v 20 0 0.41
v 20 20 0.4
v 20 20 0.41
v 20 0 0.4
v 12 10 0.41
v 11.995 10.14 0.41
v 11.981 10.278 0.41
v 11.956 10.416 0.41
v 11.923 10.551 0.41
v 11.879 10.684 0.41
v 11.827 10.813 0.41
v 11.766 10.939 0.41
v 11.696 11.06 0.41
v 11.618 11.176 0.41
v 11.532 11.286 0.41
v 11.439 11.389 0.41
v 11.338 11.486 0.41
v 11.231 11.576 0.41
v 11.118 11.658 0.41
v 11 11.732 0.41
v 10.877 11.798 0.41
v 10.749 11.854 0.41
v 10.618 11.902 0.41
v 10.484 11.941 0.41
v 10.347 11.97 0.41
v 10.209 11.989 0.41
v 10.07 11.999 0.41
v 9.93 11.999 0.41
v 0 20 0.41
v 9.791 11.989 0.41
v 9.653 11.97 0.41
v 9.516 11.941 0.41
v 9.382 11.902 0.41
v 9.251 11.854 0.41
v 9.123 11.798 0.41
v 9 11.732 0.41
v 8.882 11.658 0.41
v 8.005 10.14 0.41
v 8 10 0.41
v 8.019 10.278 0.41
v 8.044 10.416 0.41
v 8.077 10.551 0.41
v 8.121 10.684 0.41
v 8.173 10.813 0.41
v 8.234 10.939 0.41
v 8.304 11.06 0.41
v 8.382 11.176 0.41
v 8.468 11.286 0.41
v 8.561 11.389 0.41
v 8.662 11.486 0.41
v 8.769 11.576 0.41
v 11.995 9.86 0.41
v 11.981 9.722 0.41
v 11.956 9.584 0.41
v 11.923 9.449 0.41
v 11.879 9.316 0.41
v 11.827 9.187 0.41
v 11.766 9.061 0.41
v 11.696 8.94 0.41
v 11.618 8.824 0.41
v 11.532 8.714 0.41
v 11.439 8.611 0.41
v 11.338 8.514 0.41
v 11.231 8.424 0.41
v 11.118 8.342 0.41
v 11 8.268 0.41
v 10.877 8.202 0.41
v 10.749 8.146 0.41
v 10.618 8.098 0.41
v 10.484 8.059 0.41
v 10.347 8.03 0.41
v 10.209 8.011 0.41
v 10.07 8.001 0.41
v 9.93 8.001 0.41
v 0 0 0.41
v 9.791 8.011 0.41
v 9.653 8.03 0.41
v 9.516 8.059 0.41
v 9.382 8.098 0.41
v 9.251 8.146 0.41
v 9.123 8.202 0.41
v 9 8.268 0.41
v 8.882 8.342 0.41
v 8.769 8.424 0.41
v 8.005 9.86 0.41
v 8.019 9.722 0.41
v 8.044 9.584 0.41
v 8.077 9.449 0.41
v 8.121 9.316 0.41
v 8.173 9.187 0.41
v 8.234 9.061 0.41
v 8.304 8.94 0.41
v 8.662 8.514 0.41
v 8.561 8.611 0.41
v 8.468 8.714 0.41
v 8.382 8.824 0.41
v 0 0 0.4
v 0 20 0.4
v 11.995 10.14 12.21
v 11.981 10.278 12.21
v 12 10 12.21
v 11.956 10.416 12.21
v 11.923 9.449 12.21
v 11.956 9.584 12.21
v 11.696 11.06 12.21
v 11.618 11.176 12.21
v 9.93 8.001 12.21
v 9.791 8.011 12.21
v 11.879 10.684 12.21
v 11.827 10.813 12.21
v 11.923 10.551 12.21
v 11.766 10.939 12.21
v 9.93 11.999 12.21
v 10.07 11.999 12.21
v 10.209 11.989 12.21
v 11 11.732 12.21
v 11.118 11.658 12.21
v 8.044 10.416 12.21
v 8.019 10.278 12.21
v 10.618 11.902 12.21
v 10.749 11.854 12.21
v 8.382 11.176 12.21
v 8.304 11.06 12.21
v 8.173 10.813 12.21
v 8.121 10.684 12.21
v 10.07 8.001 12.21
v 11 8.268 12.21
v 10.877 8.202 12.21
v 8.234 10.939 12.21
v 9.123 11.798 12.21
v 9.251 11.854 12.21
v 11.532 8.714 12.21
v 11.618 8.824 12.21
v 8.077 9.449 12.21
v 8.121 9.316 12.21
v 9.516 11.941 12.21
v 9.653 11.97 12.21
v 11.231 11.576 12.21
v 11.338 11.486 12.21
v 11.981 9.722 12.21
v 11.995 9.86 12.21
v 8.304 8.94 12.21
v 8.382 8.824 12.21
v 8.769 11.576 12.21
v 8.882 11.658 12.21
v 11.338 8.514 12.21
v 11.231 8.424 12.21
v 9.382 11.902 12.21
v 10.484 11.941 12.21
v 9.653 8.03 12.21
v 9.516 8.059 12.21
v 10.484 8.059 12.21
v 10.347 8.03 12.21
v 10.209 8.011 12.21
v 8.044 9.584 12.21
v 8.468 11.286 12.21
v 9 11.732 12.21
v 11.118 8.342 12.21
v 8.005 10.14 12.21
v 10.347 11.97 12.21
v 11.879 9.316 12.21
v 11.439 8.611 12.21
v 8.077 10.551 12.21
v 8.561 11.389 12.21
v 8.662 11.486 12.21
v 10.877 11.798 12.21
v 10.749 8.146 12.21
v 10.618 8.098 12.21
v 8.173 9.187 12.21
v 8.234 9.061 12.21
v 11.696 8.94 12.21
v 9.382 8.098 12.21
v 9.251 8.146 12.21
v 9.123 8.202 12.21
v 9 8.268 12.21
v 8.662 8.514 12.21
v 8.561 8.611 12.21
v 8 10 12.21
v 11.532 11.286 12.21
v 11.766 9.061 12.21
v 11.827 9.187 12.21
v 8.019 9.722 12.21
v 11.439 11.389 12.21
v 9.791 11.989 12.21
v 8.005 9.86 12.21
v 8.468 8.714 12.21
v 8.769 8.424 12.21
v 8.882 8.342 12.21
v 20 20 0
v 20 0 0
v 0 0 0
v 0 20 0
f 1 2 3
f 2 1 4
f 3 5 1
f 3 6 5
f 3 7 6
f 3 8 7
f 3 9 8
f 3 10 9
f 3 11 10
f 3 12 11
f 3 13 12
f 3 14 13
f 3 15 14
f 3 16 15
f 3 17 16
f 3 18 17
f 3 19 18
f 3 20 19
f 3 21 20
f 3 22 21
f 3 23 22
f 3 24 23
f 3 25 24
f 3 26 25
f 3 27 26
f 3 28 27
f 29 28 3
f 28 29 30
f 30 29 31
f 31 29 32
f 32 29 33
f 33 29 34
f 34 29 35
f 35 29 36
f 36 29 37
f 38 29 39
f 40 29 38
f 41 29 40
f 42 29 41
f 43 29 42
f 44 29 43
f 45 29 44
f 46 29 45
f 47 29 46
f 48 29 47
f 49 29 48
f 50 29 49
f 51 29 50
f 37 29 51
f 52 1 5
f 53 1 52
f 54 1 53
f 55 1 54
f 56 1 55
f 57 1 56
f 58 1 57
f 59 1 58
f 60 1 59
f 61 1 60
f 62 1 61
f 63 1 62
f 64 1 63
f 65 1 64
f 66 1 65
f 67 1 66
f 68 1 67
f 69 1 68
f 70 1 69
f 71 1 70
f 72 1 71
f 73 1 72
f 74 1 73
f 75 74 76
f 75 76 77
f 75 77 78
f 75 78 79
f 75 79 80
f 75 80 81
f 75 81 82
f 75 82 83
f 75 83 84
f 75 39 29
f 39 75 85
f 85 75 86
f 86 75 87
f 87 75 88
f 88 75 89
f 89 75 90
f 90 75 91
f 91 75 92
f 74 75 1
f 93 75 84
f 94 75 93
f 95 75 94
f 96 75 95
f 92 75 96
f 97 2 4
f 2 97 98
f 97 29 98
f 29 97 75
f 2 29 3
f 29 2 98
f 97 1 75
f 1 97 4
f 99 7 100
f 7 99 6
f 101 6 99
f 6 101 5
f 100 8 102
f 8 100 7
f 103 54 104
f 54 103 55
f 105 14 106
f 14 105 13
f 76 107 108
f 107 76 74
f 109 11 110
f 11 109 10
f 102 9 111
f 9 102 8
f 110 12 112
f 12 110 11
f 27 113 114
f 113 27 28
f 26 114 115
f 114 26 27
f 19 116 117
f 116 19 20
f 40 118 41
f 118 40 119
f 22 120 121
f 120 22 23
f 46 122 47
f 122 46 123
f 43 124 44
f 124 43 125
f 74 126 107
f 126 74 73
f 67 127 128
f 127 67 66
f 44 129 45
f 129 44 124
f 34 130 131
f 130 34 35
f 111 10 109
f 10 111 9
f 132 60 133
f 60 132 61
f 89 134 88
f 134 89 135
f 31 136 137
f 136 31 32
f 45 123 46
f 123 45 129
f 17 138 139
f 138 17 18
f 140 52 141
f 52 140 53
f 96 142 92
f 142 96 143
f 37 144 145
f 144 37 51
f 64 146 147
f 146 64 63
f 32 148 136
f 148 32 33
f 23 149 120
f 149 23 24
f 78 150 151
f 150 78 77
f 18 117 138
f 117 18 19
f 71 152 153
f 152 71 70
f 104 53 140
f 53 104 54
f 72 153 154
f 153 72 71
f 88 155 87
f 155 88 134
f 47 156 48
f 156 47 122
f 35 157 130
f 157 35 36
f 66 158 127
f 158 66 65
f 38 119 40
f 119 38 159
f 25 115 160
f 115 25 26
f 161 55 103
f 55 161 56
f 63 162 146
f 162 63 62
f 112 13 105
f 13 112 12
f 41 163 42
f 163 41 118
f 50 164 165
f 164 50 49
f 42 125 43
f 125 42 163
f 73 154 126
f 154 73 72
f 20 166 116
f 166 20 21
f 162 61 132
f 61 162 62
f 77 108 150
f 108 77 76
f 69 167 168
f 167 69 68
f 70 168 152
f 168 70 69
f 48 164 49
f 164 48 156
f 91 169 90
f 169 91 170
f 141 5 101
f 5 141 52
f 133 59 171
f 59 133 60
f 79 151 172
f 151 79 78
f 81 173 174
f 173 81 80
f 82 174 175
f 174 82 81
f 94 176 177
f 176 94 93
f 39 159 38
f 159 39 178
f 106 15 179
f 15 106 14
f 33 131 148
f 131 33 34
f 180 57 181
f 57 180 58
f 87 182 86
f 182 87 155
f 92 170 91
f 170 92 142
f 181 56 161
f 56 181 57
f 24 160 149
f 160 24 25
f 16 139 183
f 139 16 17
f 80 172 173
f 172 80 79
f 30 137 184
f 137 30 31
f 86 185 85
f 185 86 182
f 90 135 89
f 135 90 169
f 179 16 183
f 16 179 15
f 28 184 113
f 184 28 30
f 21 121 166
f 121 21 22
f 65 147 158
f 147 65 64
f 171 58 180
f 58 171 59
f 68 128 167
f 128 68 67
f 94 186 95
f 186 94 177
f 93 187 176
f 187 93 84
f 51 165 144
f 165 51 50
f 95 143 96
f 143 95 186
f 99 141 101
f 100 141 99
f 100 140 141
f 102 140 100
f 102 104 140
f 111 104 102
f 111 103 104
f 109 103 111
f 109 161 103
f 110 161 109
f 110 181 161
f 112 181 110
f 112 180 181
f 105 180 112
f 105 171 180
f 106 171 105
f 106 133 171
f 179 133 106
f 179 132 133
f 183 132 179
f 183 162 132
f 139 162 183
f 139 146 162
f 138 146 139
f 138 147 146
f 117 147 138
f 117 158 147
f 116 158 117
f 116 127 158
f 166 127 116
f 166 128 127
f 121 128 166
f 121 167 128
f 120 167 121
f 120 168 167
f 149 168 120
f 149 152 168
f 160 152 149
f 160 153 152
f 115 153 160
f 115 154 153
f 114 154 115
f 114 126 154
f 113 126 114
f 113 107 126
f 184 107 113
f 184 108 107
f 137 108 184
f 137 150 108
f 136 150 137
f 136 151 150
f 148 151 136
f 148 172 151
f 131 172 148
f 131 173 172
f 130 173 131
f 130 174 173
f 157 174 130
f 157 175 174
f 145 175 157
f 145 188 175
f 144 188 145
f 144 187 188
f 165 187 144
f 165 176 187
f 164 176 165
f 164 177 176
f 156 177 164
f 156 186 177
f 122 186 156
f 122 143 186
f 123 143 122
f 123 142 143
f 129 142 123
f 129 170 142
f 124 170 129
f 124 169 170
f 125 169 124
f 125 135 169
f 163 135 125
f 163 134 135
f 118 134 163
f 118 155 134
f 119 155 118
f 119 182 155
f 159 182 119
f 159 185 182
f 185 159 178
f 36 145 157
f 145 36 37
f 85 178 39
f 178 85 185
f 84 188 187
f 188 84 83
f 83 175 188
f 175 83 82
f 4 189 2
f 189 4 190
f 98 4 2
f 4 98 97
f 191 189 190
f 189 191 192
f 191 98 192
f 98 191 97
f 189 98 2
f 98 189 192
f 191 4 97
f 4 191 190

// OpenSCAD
// file: ../../Base/Boxes.scad
// Fischertechnik Box Foundation
// Pre-designed Boxes

use <Constants.scad>

include <PlacementOptions.scad>

box190Width = 190;
box190Depth = 130;
box130Width = 130;
box130Depth = 95;
boxUsageHeight = 33.9;
boxWallThickness = 2.4;
boxBaseThickness = 1.0;
boxWebWidth = 3.0;

// getBoxWallThickness()
// Gets the wall thickness of a Fischertechnik Box

function getBoxWallThickness() = boxWallThickness;

// Gets the usable height of a fischertechnik box
function getBoxUsageHeight() = boxUsageHeight;

// Gets the thickness of the Fischertechnik box base.
function getBoxBaseThickness() = boxBaseThickness;

// Gets the width of a box web
function getBoxWebWidth() = boxWebWidth;

// Gets the usable inner space of a Box 190 as an x/y-list
function getBox190Space() = [
    box190Width - 2*getBoxWallThickness(), 
    box190Depth - 2*getBoxWallThickness() ];

// Imports the Fischertechnik empty box 130x190 mm and places it at position 0,0
// 190x130 are the outer sizes, the inner space is slightly smaller. Use getBox190Space() to get the inner sizes.
// This module needs the STL file "Fischertechnik Box 130x190.stl" in the library path.
// The box is positioned that the usable inner space is at the 0,0,0 position. The

module Box190() {
    translate([-getBoxWallThickness(),-getBoxWallThickness(),-getBoxBaseThickness()])
        import("Fischertechnik Box 130x190.stl", convexity=3);
}

// Gets the usable inner space of a Box 130 as an x/y-list
function getBox130Space() = [
    box130Width - 2*getBoxWallThickness(), 
    box130Depth - 2*getBoxWallThickness() ];

// Imports the Fischertechnik empty box 95x130 mm and places it at position 0,0
// 190x130 are the outer sizes, the inner space is slightly smaller. Use getBox190Space() to get the inner sizes.
// This module needs the STL file "Fischertechnik Box 95x130.stl" in the library path.
// The box is positioned that the usable inner space is at the 0,0,0 position. The

module Box130() {
    translate([-getBoxWallThickness(),-getBoxWallThickness(),-getBoxBaseThickness()])
        import("Fischertechnik Box 95x130.stl", convexity=3);
}

// Creates a web at the specified box walls
// corner 0 = LowerLeft, 1 = UpperLeft, 2 = UpperRight, 3 = LowerRight
// side 0 = LeftOfCorner, 1 = RightOfCorner
// distance = Distance in mm from the corner
// box = inner width and depth of the box (default: Box 190)
// webWidth = length of the web (default is 3 mms)
// webThickness = thickness of the web (default is 1 mm)

module BoxWeb(corner, side, distance, box=getBox190Space(), webWidth=getBoxWebWidth(), webThickness=1.0) {
    sink = getBoxWallThickness()/2;

    width = (corner % 2 == 0) ? 
            (side == LeftOfCorner ? webWidth : webThickness) :
            (side == LeftOfCorner ? webThickness : webWidth);

    depth = (corner % 2 == 0) ? 
            (side == RightOfCorner ? webWidth : webThickness) :
            (side == RightOfCorner ? webThickness : webWidth);
    
    xDiff = corner == LowerLeft ? 
                (side == LeftOfCorner ? -sink : distance) :
            (corner == UpperLeft ?                
                (side == LeftOfCorner ? distance : -sink) :
            (corner == UpperRight ?
                (side == LeftOfCorner ? box.x-webWidth+sink : box.x-distance-webThickness) :
                (side == LeftOfCorner ? box.x-distance-webThickness: box.x-webWidth+sink)));

    yDiff = corner == LowerLeft ? 
                (side == RightOfCorner ? -sink : distance) :
            (corner == UpperLeft ?
                (side == RightOfCorner ? box.y-distance : box.y-webWidth+sink) :
            (corner == UpperRight ?
                (side == RightOfCorner ? box.y-webWidth+sink : box.y-distance) :
                (side == RightOfCorner ? distance : -sink)));
    
    translate([xDiff, yDiff, -getExcess()])
        cube([width, depth, boxUsageHeight + 2*getExcess()]);
}
// file: ../../Base/Rotation.scad
// Fischertechnik Box Foundation
// Geometry Helpers Rotation

include <PlacementOptions.scad>

// getRotatedSpace(space, rotation=NoRotation)
// Rotates the space dependent on the specified rotation

function getRotatedSpace(space, rotation=NoRotation) = [
    (rotation == Rotate90 || rotation == Rotate270) ? space.y : space.x,
    (rotation == Rotate90 || rotation == Rotate270) ? space.x : space.y
];

// Rotates the given space around the fixed left lower corner
// space = the space the children needs as width/depth list [width,depth]
// rotation = 0 Rotate0 degrees, 1 Rotate90 degrees, 2 Rotate180 degrees, 3 Rotate270 degrees (equivalent to -90)

module RotateFix(space, rotation=Rotate0) {
    dy = (rotation == Rotate0 || rotation == Rotate270) ? 0 :
        (rotation == Rotate90) ? space.x :
        space.y;
    dx = (rotation < Rotate180) ? 0 :
        (rotation == Rotate180) ? space.x :
        space.y;
    
    translate([dx, dy, 0])
        rotate([0, 0, rotations[rotation]])
            children();
}
// file: ../../Base/Alignment.scad
// Fischertechnik Box Foundation
// Geometry Helpers Alignment

include <PlacementOptions.scad>

// getAlignedX(elementWidth, spaceWidth, align=AlignRight, offset=0)
// Gets the aligned X offset of an element with the given
// width in the given space.
// elementWidth = The width of the element to positon
// spaceWidth = The space where the element should be aligned
// align = 0 AlignLeft, 1 AlignCenter, 2 AlignRight
// offset = an optional offset from the aligned position. When
// aligned left or centered, then positive values are in X direction.
// When aligned right then positive values are in negative X direction.

function getAlignedX(elementWidth, spaceWidth, align=AlignRight, offset=0) =
    (align == AlignLeft) ?
        offset :
        ((align == AlignCenter) ?
        (spaceWidth - elementWidth)/2 + offset :
        spaceWidth - offset - elementWidth);

// getAlignedY(elementDepth, spaceDepth, align=AlignTop, offset=0)
// Gets the aligned Y offset of an element with the given
// depth in the given space.
// elementDepth = The depth of the element to positon
// spaceDepth = The space where the element should be aligned
// align = 0 AlignBottom, 1 AlignCenter, 2 AlignTop
// offset = an optional offset from the aligned position. When
// aligned bottom or centered, then positive values are in Y direction.
// When aligned top then positive values are in negative Y direction.

function getAlignedY(elementDepth, spaceDepth, align=AlignTop, offset=0) =
    (align == AlignBottom) ?
        offset :
        ((align == AlignCenter) ?
        (spaceDepth - elementDepth)/2 + offset :
        spaceDepth - offset - elementDepth);
// file: ../../Base/PlacementOptions.scad
// Fischertechnik Box Foundation
// Placement Options

// Alignment
NoAlign = 0;
AlignLeft = 1;
AlignBottom = 2;
AlignCenter = 3;
AlignRight = 4;
AlignTop = 5;

// Element rotation degree steps
rotations = [0, -90, -180, -270];

// Rotation
NoRotation = 0;
Rotate0 = 0;
Rotate90 = 1;
Rotate180 = 2;
Rotate270 = 3;

// Docking (seen from above)
NoDock = -1;
DockLeft = 0;
DockTop = 1;
DockRight = 2;
DockCorner = 2;
DockBottom = 3;

// Web corners
LowerLeft = 0;
UpperLeft = 1;
UpperRight = 2;
LowerRight = 3;

// Web position relative to corner
LeftOfCorner = 0;
RightOfCorner = 1;
// file: ../../Base/Placement.scad
// Fischertechnik Box Foundation
// Geometry Helpers Placement

use <Constants.scad>
use <Alignment.scad>
use <Rotation.scad>
use <Boxes.scad>

include <PlacementOptions.scad>

// Place(x=0, y=0, elementSpace=[0,0], alignX=AlignLeft, alignY=AlignBottom, rotation=Rotate0, boxSpace=getBox190Space())
// Places the child at the specified position
// y = Y-Position. This is a relative position when an X aligment is specified.
// x = X-Position. This is a relative position when an Y aligment is specified.
// elementSpace = space of the element to be placed [x,y]
// alignX = -1=NoAlign, 0 AlignLeft, 1 AlignCenter, 3 AlignRight (elementSpace and boxSpace required!)
// alignY = -1=NoAlign, 2 AlignBottom, 1 AlignCenter, 4 AlignTop (elementSpace and boxSpace required!)
// rotation = 0 Rotate0 0 degrees, 1 Rotate90 90 degrees, 
// 2 Rotate180 180 degrees, 3 Rotate270 270 degrees (equivalent to -90)
// boxSpace = Inner space of the box where the placement occurs [x,y] - default is Box 190x130 inner space

module Place(x=0, y=0, elementSpace=[0,0], 
  alignX=AlignLeft, alignY=AlignBottom, 
  rotation=NoRotation, boxSpace=getBox190Space()) {

    module Position(x, y, space, rotation=Rotate0) {
        translate([x, y, 0])
            RotateFix(space, rotation)
                children();
    }

    space = getRotatedSpace(elementSpace, rotation);
    alignedX = getAlignedX(space.x, boxSpace.x, alignX, x);
    alignedY = getAlignedY(space.y, boxSpace.y, alignY, y);
    Position(alignedX, alignedY, elementSpace, rotation)
        children();
}

// Center(space=getBox130Space(), elementSpace=[0,0])
// space = Space where the children is centered. For cylinder use centered=true and no elementSpace.
// elementSpace = space of the element to be centered [x,y]

module Center(space=getBox190Space(), elementSpace=[0,0]) {
    translate([(space.x - elementSpace.x) / 2, (space.y - elementSpace.y) / 2])
        children(0);
}

// CenterHorizontal(width=0, y=0, offset=0, space=getBox130Space())
// space = Space where the children is centered. For cylinder use centered=true and no elementSpace.
// elementSpace = space of the element to be centered [x,y]

module CenterHorizontal(width=0, y=0, offset=0, space=getBox190Space()) {
    translate([(space.x - width) / 2 + offset, y])
        children(0);
}

// CenterVertical(depth=0, x=0, offset=0, space=getBox130Space())
// space = Space where the children is centered. For cylinder use centered=true and no elementSpace.
// elementSpace = space of the element to be centered [x,y]

module CenterVertical(depth=0, x=0, offset=0, space=getBox190Space()) {
    translate([x, (space.y - depth) / 2 + offset])
        children(0);
}
// file: ../../Elements/AxisClip10.scad
// Fischertechnik Box Library
// Axis for clip 10
// 31023

use <../ModelBase/Simple.scad>

width = 12;
depth = 12;
height = 23;

// getAxisClip10Space()
// Gets the space of a frame for a clip 10 with spring ring (mot2)

function getAxisClip10Space() = [width, depth, height];

// AxisClip10()
// Axis for clip 10 with spring ring (mot2)

module AxisClip10() {
    LeveledAxisWithSpace(height, height-10, getAxisClip10Space());
}

// Tests
color("lightgray")
AxisClip10();
// file: ../../Base/Constants.scad
// Fischertechnik Box Foundation
// Constants

// Constant values necessary for multiple elements

// Base constants
dividerThickness = 1.2;
excess = 0.01;
fragments = 90;
tolerance = 0.8;

// Gets the thickness of a divider 
function getDividerThickness() = dividerThickness;

// Gets the excess that is used to merge walls into each other
function getExcess() = excess;

// Gets amount of fragments of a cylinder
function getFragments() = fragments;

// Gets the inner tolerance of a frame to each side
function getTolerance() = tolerance;


// Fischertechnik specific constants
axisDiameter = 4;
axisBottomDiameter = axisDiameter + 1;
standardEdgeDistance = 2.5;
standardWebDistance = 11.5;
standardCornerLength = 15;
tubeWallFactor = 0.8;

// Gets axis diameter
function getAxisDiameter() = axisDiameter;

// Gets axis bottom diameter for thicker part at the bottom
function getAxisBottomDiameter() = axisBottomDiameter;

// gets the standard distance to the wall of the box for dockable frames with webs
function getStandardEdgeDistance() = standardEdgeDistance;

// gets the standard distance of each web to the corner of the dockable frame
function getStandardWebDistance() = standardWebDistance;

// gets the standard length of the corner walls of a dockable frame
function getStandardCornerLength() = standardCornerLength;

// gets the wall thickness of a tube.
function getTubeWallThickness() = tubeWallFactor * getDividerThickness();
// file: ../../Elements/AxisCogWheel.scad
// Fischertechnik Box Library
// Axis for Cog Wheel 10 and Bevel Gear Wheel
// 31047 and 31051

use <../Base/Constants.scad>
use <../ModelBase/Simple.scad>

space = 20;

// getAxisCogWheelSpace()
// Gets the space the winch drum holder needs as width (.x and .y as a list)

function getAxisCogWheelSpace() = [space, space];

// AxisCogWheel()
// Standing axis for a cog wheel 31047 or
// a bevel gear wheel 31051

module AxisCogWheel() {
    height = 11.8;
    AxisWithSpace(height, getAxisCogWheelSpace());
}

// Tests
color("lightgray")
AxisCogWheel();
// file: ../TestPrint.scad
// 3D Print Test Base

use <../Base/Constants.scad>

use <../Elements/AxisClip10.scad>

module TestPrint(elementSpace) {
    cube([elementSpace.x, elementSpace.y, 0.4]);
    translate([0,0,0.4+getExcess()]) {
        children();
    }
}

TestPrint(getAxisClip10Space())
    AxisClip10();
// main file
// 3D Print Test
// AxisCogWheel

use <../TestPrint.scad>
use <../../Elements/AxisCogWheel.scad>

TestPrint(getAxisCogWheelSpace())
    AxisCogWheel();
